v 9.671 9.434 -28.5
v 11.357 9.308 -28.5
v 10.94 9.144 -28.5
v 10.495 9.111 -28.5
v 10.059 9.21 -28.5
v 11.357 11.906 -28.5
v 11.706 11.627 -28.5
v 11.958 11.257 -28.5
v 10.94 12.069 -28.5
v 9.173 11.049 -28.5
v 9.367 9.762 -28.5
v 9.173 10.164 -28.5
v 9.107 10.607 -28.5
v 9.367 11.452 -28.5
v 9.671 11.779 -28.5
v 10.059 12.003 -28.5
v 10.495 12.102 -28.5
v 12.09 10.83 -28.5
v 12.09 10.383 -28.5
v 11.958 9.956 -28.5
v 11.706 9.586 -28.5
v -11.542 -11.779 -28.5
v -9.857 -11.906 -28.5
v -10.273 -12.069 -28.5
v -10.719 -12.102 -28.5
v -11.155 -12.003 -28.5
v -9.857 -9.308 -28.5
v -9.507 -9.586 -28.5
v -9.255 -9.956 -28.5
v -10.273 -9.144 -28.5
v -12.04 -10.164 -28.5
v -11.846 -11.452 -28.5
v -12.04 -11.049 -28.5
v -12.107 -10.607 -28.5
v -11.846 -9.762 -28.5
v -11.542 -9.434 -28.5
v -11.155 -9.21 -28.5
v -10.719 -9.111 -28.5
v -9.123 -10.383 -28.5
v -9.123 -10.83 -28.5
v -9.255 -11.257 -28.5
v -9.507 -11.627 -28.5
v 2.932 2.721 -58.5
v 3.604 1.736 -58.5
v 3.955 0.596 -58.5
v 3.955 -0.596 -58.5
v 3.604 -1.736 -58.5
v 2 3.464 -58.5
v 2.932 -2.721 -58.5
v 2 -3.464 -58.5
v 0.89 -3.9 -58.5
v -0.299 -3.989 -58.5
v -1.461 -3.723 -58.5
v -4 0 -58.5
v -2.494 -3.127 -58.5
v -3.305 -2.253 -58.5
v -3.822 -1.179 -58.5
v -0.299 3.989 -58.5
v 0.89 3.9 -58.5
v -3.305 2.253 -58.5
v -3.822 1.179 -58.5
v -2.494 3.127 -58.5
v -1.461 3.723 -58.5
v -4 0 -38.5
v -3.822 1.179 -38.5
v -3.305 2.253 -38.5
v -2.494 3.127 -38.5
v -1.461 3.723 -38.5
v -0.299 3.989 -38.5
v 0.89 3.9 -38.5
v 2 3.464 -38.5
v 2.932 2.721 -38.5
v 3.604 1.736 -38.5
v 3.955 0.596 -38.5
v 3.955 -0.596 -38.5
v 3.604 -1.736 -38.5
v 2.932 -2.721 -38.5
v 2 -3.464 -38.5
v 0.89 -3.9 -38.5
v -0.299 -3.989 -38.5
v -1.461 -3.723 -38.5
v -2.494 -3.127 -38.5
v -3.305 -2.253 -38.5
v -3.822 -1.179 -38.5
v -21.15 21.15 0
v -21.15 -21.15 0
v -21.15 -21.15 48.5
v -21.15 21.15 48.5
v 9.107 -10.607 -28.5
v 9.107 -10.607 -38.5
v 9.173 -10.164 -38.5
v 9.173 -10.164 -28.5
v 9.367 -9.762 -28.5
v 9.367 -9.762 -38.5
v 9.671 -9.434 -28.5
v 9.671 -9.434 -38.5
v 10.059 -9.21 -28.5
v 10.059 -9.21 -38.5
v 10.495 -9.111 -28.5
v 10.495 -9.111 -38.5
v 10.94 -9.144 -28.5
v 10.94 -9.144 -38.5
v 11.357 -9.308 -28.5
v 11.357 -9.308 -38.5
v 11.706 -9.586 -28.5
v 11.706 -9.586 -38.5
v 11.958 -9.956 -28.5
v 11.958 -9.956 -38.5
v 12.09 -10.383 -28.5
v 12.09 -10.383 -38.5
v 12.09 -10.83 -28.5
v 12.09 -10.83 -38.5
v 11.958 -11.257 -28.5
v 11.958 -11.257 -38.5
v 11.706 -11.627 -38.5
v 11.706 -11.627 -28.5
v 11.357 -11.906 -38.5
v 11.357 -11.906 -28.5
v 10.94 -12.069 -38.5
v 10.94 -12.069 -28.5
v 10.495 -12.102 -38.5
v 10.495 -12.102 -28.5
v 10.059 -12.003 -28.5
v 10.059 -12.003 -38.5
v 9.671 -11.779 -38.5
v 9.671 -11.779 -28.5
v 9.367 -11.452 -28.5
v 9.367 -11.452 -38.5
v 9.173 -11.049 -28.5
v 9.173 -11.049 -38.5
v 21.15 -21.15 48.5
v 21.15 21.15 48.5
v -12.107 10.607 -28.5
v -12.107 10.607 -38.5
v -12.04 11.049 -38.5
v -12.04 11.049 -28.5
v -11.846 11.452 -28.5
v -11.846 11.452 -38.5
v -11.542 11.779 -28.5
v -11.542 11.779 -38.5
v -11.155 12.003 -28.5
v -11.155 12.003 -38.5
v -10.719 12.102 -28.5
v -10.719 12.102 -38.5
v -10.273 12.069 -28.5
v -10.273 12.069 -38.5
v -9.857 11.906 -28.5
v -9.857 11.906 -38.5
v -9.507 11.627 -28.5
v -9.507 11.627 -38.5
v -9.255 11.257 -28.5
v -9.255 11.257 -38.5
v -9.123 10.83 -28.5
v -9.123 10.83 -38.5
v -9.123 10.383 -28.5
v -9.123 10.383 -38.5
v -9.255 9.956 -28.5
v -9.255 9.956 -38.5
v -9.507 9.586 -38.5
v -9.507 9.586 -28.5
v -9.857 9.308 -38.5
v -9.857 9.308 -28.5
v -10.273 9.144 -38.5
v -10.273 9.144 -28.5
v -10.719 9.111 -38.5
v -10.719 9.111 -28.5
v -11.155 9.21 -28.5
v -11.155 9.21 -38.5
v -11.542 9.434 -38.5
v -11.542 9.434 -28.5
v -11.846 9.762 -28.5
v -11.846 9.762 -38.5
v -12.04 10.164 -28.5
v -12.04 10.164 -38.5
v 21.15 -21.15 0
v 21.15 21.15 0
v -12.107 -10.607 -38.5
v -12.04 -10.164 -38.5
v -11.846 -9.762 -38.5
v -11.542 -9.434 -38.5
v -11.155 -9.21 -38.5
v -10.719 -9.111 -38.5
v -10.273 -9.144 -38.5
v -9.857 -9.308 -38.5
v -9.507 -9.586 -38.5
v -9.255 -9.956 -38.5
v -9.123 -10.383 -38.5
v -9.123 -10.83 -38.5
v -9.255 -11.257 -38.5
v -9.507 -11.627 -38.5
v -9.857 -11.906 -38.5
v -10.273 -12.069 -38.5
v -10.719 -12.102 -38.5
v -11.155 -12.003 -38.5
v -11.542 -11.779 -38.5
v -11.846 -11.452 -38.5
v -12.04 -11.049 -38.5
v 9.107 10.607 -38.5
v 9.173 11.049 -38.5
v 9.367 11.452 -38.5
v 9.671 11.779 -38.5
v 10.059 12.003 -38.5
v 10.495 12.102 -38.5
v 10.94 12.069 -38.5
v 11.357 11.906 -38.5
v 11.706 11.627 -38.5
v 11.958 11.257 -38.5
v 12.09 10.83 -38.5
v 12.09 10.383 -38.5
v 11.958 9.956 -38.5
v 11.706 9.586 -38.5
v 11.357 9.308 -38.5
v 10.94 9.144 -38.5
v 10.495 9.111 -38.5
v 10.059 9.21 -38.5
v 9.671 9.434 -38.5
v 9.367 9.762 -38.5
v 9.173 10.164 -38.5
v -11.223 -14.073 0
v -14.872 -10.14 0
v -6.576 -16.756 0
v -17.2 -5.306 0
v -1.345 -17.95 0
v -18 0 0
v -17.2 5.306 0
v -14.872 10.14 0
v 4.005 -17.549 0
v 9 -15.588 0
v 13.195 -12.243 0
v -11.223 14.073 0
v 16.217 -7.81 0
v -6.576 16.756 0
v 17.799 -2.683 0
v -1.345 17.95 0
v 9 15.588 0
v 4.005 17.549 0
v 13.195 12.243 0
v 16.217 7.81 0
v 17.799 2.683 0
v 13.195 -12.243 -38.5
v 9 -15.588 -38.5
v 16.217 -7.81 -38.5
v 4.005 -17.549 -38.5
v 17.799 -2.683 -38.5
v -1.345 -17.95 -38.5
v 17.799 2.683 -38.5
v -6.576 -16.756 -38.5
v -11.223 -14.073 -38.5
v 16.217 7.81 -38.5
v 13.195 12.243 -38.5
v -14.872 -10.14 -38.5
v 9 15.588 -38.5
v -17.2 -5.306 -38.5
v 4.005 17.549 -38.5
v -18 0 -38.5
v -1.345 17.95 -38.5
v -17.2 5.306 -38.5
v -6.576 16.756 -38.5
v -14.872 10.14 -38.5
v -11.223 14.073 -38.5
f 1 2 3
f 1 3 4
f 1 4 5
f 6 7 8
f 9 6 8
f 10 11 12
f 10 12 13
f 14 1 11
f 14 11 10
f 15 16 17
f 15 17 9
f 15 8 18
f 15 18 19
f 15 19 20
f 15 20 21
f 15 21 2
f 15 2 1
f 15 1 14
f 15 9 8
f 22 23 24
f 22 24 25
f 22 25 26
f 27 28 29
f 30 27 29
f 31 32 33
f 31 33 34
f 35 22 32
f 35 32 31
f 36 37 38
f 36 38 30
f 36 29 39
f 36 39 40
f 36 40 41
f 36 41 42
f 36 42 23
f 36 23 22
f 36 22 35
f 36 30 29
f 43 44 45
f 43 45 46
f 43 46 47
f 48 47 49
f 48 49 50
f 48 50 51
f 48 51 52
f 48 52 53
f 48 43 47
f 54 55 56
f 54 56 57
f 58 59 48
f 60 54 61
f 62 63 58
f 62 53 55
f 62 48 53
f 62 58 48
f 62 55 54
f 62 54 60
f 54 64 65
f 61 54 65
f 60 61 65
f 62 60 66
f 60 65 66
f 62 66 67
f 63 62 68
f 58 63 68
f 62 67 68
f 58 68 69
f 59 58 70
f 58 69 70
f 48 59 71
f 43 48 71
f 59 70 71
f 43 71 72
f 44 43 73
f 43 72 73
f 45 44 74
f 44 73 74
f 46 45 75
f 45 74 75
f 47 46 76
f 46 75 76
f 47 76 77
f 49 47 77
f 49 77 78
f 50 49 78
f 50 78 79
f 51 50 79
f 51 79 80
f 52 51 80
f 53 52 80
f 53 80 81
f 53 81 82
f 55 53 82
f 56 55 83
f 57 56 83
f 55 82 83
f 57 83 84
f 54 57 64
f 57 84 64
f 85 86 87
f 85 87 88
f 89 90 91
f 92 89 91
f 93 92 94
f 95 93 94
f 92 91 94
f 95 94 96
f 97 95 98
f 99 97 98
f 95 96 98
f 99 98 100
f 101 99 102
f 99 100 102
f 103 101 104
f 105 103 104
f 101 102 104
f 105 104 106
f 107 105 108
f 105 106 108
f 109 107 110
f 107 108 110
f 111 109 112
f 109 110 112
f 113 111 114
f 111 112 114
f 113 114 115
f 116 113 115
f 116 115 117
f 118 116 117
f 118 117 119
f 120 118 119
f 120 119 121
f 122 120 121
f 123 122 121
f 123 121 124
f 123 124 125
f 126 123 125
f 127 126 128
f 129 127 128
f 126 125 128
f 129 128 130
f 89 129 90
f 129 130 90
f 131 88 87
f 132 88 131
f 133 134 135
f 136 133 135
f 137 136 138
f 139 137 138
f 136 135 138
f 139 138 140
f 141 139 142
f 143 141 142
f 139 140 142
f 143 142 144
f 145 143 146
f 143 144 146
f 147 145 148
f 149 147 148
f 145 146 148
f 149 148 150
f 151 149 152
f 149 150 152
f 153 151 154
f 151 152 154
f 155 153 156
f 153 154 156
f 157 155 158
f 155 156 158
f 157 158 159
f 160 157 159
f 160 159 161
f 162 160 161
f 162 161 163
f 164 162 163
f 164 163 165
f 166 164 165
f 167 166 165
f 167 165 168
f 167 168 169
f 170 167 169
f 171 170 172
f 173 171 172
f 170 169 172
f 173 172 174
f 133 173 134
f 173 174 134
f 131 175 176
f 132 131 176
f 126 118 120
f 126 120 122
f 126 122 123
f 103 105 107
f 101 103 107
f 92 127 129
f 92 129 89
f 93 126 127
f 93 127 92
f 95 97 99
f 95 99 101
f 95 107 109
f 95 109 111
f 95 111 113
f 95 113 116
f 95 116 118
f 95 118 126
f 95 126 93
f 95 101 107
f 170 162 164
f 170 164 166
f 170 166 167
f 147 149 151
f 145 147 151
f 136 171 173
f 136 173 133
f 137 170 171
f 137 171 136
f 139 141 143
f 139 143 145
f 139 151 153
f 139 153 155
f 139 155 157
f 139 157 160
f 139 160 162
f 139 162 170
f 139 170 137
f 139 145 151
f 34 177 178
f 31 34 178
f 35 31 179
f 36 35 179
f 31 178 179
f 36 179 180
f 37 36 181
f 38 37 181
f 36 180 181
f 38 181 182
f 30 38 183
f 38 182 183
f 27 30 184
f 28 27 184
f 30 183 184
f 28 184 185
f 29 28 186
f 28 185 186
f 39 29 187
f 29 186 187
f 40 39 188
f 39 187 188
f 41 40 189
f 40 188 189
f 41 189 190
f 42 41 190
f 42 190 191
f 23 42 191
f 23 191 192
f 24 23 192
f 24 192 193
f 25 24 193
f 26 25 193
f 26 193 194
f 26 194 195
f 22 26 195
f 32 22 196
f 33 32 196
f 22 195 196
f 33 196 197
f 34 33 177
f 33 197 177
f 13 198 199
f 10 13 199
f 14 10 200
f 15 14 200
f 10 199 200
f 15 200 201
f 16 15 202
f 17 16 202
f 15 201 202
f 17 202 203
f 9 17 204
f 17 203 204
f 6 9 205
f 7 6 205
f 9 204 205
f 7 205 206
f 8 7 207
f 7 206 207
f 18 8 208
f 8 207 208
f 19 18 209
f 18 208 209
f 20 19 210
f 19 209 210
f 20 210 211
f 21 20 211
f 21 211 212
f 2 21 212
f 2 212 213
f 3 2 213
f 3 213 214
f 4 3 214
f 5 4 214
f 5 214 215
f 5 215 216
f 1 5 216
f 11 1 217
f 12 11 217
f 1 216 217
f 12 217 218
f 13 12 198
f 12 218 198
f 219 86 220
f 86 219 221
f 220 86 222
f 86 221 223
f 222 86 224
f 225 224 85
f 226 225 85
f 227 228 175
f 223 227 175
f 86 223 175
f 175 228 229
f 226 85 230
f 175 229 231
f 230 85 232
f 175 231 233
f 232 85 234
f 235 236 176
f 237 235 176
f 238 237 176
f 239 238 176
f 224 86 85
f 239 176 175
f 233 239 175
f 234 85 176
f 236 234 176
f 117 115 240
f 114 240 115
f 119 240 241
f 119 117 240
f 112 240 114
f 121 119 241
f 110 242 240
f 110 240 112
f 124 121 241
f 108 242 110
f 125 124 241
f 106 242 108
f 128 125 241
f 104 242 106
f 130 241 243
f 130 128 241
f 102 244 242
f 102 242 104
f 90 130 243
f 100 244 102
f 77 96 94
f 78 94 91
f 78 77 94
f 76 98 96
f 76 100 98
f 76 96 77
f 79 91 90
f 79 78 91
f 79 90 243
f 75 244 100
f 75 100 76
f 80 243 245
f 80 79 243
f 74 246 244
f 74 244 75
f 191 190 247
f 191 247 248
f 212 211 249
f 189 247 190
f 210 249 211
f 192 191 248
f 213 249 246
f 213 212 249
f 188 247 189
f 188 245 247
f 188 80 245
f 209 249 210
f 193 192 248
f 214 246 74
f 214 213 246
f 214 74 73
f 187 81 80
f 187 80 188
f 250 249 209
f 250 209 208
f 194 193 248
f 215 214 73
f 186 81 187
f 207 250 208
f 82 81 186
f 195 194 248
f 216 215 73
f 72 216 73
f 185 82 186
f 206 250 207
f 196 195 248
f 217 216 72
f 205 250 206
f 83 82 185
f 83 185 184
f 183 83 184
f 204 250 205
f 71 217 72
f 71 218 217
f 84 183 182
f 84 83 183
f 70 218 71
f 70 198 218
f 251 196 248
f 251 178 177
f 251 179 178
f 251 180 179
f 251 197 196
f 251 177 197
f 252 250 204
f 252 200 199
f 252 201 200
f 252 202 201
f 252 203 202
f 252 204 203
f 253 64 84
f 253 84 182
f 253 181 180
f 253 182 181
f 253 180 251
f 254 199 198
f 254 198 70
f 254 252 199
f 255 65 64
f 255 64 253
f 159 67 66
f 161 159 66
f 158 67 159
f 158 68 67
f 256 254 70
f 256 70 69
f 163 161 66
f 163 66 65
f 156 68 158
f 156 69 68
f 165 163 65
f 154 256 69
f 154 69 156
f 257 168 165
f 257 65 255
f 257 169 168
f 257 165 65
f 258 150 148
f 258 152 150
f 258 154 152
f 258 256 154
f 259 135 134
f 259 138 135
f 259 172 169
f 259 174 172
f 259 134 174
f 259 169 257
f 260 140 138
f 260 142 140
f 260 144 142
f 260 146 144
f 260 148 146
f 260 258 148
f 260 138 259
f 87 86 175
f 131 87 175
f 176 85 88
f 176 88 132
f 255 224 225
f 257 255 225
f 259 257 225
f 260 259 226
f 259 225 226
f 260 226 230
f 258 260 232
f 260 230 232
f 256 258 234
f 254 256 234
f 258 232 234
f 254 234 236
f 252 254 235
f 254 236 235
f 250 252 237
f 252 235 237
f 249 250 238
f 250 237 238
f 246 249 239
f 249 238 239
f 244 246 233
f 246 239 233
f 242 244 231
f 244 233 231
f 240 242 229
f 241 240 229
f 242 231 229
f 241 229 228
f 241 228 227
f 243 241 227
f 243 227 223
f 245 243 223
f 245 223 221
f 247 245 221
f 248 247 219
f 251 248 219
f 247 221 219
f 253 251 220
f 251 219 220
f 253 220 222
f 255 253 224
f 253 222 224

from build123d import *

# Parameters (mm, degrees)
SKETCH1_W           = 42.3
SKETCH1_H           = 42.3
BOSS_EXTRUDE1_DEPTH = 48.5
SKETCH3_R           = 18
BOSS_EXTRUDE2_DEPTH = 38.5
SKETCH5_R           = 4
BOSS_EXTRUDE3_DEPTH = 20
SKETCH6_R           = 1.5
CUT_EXTRUDE1_DEPTH  = 10


with BuildPart() as part:
    # Sketch1 → Boss-Extrude1 (new body)
    with BuildSketch(Plane.XY):
        Rectangle(SKETCH1_W, SKETCH1_H)
    extrude(amount=BOSS_EXTRUDE1_DEPTH)

    # Sketch3 → Boss-Extrude2 (add)
    with BuildSketch(Plane(origin=(0, 0, 0), x_dir=(-1, 0, 0), z_dir=(0, 0, -1))):
        Circle(SKETCH3_R)
    extrude(amount=BOSS_EXTRUDE2_DEPTH)

    # Sketch5 → Boss-Extrude3 (add)
    with BuildSketch(Plane(origin=(0, 0, -38.5), x_dir=(-1, 0, 0), z_dir=(0, 0, -1))):
        Circle(SKETCH5_R)
    extrude(amount=BOSS_EXTRUDE3_DEPTH)

    # Sketch6 → Cut-Extrude1 (cut)
    with BuildSketch(Plane(origin=(0, 0, -38.5), x_dir=(-1, 0, 0), z_dir=(0, 0, -1))):
        with Locations((-10.606601718, 10.606601718)):
            Circle(SKETCH6_R)
        with Locations((10.606601718, 10.606601718)):
            Circle(SKETCH6_R)
        with Locations((10.606601718, -10.606601718)):
            Circle(SKETCH6_R)
        with Locations((-10.606601718, -10.606601718)):
            Circle(SKETCH6_R)
    extrude(amount=-CUT_EXTRUDE1_DEPTH, mode=Mode.SUBTRACT)


solid = part.part
